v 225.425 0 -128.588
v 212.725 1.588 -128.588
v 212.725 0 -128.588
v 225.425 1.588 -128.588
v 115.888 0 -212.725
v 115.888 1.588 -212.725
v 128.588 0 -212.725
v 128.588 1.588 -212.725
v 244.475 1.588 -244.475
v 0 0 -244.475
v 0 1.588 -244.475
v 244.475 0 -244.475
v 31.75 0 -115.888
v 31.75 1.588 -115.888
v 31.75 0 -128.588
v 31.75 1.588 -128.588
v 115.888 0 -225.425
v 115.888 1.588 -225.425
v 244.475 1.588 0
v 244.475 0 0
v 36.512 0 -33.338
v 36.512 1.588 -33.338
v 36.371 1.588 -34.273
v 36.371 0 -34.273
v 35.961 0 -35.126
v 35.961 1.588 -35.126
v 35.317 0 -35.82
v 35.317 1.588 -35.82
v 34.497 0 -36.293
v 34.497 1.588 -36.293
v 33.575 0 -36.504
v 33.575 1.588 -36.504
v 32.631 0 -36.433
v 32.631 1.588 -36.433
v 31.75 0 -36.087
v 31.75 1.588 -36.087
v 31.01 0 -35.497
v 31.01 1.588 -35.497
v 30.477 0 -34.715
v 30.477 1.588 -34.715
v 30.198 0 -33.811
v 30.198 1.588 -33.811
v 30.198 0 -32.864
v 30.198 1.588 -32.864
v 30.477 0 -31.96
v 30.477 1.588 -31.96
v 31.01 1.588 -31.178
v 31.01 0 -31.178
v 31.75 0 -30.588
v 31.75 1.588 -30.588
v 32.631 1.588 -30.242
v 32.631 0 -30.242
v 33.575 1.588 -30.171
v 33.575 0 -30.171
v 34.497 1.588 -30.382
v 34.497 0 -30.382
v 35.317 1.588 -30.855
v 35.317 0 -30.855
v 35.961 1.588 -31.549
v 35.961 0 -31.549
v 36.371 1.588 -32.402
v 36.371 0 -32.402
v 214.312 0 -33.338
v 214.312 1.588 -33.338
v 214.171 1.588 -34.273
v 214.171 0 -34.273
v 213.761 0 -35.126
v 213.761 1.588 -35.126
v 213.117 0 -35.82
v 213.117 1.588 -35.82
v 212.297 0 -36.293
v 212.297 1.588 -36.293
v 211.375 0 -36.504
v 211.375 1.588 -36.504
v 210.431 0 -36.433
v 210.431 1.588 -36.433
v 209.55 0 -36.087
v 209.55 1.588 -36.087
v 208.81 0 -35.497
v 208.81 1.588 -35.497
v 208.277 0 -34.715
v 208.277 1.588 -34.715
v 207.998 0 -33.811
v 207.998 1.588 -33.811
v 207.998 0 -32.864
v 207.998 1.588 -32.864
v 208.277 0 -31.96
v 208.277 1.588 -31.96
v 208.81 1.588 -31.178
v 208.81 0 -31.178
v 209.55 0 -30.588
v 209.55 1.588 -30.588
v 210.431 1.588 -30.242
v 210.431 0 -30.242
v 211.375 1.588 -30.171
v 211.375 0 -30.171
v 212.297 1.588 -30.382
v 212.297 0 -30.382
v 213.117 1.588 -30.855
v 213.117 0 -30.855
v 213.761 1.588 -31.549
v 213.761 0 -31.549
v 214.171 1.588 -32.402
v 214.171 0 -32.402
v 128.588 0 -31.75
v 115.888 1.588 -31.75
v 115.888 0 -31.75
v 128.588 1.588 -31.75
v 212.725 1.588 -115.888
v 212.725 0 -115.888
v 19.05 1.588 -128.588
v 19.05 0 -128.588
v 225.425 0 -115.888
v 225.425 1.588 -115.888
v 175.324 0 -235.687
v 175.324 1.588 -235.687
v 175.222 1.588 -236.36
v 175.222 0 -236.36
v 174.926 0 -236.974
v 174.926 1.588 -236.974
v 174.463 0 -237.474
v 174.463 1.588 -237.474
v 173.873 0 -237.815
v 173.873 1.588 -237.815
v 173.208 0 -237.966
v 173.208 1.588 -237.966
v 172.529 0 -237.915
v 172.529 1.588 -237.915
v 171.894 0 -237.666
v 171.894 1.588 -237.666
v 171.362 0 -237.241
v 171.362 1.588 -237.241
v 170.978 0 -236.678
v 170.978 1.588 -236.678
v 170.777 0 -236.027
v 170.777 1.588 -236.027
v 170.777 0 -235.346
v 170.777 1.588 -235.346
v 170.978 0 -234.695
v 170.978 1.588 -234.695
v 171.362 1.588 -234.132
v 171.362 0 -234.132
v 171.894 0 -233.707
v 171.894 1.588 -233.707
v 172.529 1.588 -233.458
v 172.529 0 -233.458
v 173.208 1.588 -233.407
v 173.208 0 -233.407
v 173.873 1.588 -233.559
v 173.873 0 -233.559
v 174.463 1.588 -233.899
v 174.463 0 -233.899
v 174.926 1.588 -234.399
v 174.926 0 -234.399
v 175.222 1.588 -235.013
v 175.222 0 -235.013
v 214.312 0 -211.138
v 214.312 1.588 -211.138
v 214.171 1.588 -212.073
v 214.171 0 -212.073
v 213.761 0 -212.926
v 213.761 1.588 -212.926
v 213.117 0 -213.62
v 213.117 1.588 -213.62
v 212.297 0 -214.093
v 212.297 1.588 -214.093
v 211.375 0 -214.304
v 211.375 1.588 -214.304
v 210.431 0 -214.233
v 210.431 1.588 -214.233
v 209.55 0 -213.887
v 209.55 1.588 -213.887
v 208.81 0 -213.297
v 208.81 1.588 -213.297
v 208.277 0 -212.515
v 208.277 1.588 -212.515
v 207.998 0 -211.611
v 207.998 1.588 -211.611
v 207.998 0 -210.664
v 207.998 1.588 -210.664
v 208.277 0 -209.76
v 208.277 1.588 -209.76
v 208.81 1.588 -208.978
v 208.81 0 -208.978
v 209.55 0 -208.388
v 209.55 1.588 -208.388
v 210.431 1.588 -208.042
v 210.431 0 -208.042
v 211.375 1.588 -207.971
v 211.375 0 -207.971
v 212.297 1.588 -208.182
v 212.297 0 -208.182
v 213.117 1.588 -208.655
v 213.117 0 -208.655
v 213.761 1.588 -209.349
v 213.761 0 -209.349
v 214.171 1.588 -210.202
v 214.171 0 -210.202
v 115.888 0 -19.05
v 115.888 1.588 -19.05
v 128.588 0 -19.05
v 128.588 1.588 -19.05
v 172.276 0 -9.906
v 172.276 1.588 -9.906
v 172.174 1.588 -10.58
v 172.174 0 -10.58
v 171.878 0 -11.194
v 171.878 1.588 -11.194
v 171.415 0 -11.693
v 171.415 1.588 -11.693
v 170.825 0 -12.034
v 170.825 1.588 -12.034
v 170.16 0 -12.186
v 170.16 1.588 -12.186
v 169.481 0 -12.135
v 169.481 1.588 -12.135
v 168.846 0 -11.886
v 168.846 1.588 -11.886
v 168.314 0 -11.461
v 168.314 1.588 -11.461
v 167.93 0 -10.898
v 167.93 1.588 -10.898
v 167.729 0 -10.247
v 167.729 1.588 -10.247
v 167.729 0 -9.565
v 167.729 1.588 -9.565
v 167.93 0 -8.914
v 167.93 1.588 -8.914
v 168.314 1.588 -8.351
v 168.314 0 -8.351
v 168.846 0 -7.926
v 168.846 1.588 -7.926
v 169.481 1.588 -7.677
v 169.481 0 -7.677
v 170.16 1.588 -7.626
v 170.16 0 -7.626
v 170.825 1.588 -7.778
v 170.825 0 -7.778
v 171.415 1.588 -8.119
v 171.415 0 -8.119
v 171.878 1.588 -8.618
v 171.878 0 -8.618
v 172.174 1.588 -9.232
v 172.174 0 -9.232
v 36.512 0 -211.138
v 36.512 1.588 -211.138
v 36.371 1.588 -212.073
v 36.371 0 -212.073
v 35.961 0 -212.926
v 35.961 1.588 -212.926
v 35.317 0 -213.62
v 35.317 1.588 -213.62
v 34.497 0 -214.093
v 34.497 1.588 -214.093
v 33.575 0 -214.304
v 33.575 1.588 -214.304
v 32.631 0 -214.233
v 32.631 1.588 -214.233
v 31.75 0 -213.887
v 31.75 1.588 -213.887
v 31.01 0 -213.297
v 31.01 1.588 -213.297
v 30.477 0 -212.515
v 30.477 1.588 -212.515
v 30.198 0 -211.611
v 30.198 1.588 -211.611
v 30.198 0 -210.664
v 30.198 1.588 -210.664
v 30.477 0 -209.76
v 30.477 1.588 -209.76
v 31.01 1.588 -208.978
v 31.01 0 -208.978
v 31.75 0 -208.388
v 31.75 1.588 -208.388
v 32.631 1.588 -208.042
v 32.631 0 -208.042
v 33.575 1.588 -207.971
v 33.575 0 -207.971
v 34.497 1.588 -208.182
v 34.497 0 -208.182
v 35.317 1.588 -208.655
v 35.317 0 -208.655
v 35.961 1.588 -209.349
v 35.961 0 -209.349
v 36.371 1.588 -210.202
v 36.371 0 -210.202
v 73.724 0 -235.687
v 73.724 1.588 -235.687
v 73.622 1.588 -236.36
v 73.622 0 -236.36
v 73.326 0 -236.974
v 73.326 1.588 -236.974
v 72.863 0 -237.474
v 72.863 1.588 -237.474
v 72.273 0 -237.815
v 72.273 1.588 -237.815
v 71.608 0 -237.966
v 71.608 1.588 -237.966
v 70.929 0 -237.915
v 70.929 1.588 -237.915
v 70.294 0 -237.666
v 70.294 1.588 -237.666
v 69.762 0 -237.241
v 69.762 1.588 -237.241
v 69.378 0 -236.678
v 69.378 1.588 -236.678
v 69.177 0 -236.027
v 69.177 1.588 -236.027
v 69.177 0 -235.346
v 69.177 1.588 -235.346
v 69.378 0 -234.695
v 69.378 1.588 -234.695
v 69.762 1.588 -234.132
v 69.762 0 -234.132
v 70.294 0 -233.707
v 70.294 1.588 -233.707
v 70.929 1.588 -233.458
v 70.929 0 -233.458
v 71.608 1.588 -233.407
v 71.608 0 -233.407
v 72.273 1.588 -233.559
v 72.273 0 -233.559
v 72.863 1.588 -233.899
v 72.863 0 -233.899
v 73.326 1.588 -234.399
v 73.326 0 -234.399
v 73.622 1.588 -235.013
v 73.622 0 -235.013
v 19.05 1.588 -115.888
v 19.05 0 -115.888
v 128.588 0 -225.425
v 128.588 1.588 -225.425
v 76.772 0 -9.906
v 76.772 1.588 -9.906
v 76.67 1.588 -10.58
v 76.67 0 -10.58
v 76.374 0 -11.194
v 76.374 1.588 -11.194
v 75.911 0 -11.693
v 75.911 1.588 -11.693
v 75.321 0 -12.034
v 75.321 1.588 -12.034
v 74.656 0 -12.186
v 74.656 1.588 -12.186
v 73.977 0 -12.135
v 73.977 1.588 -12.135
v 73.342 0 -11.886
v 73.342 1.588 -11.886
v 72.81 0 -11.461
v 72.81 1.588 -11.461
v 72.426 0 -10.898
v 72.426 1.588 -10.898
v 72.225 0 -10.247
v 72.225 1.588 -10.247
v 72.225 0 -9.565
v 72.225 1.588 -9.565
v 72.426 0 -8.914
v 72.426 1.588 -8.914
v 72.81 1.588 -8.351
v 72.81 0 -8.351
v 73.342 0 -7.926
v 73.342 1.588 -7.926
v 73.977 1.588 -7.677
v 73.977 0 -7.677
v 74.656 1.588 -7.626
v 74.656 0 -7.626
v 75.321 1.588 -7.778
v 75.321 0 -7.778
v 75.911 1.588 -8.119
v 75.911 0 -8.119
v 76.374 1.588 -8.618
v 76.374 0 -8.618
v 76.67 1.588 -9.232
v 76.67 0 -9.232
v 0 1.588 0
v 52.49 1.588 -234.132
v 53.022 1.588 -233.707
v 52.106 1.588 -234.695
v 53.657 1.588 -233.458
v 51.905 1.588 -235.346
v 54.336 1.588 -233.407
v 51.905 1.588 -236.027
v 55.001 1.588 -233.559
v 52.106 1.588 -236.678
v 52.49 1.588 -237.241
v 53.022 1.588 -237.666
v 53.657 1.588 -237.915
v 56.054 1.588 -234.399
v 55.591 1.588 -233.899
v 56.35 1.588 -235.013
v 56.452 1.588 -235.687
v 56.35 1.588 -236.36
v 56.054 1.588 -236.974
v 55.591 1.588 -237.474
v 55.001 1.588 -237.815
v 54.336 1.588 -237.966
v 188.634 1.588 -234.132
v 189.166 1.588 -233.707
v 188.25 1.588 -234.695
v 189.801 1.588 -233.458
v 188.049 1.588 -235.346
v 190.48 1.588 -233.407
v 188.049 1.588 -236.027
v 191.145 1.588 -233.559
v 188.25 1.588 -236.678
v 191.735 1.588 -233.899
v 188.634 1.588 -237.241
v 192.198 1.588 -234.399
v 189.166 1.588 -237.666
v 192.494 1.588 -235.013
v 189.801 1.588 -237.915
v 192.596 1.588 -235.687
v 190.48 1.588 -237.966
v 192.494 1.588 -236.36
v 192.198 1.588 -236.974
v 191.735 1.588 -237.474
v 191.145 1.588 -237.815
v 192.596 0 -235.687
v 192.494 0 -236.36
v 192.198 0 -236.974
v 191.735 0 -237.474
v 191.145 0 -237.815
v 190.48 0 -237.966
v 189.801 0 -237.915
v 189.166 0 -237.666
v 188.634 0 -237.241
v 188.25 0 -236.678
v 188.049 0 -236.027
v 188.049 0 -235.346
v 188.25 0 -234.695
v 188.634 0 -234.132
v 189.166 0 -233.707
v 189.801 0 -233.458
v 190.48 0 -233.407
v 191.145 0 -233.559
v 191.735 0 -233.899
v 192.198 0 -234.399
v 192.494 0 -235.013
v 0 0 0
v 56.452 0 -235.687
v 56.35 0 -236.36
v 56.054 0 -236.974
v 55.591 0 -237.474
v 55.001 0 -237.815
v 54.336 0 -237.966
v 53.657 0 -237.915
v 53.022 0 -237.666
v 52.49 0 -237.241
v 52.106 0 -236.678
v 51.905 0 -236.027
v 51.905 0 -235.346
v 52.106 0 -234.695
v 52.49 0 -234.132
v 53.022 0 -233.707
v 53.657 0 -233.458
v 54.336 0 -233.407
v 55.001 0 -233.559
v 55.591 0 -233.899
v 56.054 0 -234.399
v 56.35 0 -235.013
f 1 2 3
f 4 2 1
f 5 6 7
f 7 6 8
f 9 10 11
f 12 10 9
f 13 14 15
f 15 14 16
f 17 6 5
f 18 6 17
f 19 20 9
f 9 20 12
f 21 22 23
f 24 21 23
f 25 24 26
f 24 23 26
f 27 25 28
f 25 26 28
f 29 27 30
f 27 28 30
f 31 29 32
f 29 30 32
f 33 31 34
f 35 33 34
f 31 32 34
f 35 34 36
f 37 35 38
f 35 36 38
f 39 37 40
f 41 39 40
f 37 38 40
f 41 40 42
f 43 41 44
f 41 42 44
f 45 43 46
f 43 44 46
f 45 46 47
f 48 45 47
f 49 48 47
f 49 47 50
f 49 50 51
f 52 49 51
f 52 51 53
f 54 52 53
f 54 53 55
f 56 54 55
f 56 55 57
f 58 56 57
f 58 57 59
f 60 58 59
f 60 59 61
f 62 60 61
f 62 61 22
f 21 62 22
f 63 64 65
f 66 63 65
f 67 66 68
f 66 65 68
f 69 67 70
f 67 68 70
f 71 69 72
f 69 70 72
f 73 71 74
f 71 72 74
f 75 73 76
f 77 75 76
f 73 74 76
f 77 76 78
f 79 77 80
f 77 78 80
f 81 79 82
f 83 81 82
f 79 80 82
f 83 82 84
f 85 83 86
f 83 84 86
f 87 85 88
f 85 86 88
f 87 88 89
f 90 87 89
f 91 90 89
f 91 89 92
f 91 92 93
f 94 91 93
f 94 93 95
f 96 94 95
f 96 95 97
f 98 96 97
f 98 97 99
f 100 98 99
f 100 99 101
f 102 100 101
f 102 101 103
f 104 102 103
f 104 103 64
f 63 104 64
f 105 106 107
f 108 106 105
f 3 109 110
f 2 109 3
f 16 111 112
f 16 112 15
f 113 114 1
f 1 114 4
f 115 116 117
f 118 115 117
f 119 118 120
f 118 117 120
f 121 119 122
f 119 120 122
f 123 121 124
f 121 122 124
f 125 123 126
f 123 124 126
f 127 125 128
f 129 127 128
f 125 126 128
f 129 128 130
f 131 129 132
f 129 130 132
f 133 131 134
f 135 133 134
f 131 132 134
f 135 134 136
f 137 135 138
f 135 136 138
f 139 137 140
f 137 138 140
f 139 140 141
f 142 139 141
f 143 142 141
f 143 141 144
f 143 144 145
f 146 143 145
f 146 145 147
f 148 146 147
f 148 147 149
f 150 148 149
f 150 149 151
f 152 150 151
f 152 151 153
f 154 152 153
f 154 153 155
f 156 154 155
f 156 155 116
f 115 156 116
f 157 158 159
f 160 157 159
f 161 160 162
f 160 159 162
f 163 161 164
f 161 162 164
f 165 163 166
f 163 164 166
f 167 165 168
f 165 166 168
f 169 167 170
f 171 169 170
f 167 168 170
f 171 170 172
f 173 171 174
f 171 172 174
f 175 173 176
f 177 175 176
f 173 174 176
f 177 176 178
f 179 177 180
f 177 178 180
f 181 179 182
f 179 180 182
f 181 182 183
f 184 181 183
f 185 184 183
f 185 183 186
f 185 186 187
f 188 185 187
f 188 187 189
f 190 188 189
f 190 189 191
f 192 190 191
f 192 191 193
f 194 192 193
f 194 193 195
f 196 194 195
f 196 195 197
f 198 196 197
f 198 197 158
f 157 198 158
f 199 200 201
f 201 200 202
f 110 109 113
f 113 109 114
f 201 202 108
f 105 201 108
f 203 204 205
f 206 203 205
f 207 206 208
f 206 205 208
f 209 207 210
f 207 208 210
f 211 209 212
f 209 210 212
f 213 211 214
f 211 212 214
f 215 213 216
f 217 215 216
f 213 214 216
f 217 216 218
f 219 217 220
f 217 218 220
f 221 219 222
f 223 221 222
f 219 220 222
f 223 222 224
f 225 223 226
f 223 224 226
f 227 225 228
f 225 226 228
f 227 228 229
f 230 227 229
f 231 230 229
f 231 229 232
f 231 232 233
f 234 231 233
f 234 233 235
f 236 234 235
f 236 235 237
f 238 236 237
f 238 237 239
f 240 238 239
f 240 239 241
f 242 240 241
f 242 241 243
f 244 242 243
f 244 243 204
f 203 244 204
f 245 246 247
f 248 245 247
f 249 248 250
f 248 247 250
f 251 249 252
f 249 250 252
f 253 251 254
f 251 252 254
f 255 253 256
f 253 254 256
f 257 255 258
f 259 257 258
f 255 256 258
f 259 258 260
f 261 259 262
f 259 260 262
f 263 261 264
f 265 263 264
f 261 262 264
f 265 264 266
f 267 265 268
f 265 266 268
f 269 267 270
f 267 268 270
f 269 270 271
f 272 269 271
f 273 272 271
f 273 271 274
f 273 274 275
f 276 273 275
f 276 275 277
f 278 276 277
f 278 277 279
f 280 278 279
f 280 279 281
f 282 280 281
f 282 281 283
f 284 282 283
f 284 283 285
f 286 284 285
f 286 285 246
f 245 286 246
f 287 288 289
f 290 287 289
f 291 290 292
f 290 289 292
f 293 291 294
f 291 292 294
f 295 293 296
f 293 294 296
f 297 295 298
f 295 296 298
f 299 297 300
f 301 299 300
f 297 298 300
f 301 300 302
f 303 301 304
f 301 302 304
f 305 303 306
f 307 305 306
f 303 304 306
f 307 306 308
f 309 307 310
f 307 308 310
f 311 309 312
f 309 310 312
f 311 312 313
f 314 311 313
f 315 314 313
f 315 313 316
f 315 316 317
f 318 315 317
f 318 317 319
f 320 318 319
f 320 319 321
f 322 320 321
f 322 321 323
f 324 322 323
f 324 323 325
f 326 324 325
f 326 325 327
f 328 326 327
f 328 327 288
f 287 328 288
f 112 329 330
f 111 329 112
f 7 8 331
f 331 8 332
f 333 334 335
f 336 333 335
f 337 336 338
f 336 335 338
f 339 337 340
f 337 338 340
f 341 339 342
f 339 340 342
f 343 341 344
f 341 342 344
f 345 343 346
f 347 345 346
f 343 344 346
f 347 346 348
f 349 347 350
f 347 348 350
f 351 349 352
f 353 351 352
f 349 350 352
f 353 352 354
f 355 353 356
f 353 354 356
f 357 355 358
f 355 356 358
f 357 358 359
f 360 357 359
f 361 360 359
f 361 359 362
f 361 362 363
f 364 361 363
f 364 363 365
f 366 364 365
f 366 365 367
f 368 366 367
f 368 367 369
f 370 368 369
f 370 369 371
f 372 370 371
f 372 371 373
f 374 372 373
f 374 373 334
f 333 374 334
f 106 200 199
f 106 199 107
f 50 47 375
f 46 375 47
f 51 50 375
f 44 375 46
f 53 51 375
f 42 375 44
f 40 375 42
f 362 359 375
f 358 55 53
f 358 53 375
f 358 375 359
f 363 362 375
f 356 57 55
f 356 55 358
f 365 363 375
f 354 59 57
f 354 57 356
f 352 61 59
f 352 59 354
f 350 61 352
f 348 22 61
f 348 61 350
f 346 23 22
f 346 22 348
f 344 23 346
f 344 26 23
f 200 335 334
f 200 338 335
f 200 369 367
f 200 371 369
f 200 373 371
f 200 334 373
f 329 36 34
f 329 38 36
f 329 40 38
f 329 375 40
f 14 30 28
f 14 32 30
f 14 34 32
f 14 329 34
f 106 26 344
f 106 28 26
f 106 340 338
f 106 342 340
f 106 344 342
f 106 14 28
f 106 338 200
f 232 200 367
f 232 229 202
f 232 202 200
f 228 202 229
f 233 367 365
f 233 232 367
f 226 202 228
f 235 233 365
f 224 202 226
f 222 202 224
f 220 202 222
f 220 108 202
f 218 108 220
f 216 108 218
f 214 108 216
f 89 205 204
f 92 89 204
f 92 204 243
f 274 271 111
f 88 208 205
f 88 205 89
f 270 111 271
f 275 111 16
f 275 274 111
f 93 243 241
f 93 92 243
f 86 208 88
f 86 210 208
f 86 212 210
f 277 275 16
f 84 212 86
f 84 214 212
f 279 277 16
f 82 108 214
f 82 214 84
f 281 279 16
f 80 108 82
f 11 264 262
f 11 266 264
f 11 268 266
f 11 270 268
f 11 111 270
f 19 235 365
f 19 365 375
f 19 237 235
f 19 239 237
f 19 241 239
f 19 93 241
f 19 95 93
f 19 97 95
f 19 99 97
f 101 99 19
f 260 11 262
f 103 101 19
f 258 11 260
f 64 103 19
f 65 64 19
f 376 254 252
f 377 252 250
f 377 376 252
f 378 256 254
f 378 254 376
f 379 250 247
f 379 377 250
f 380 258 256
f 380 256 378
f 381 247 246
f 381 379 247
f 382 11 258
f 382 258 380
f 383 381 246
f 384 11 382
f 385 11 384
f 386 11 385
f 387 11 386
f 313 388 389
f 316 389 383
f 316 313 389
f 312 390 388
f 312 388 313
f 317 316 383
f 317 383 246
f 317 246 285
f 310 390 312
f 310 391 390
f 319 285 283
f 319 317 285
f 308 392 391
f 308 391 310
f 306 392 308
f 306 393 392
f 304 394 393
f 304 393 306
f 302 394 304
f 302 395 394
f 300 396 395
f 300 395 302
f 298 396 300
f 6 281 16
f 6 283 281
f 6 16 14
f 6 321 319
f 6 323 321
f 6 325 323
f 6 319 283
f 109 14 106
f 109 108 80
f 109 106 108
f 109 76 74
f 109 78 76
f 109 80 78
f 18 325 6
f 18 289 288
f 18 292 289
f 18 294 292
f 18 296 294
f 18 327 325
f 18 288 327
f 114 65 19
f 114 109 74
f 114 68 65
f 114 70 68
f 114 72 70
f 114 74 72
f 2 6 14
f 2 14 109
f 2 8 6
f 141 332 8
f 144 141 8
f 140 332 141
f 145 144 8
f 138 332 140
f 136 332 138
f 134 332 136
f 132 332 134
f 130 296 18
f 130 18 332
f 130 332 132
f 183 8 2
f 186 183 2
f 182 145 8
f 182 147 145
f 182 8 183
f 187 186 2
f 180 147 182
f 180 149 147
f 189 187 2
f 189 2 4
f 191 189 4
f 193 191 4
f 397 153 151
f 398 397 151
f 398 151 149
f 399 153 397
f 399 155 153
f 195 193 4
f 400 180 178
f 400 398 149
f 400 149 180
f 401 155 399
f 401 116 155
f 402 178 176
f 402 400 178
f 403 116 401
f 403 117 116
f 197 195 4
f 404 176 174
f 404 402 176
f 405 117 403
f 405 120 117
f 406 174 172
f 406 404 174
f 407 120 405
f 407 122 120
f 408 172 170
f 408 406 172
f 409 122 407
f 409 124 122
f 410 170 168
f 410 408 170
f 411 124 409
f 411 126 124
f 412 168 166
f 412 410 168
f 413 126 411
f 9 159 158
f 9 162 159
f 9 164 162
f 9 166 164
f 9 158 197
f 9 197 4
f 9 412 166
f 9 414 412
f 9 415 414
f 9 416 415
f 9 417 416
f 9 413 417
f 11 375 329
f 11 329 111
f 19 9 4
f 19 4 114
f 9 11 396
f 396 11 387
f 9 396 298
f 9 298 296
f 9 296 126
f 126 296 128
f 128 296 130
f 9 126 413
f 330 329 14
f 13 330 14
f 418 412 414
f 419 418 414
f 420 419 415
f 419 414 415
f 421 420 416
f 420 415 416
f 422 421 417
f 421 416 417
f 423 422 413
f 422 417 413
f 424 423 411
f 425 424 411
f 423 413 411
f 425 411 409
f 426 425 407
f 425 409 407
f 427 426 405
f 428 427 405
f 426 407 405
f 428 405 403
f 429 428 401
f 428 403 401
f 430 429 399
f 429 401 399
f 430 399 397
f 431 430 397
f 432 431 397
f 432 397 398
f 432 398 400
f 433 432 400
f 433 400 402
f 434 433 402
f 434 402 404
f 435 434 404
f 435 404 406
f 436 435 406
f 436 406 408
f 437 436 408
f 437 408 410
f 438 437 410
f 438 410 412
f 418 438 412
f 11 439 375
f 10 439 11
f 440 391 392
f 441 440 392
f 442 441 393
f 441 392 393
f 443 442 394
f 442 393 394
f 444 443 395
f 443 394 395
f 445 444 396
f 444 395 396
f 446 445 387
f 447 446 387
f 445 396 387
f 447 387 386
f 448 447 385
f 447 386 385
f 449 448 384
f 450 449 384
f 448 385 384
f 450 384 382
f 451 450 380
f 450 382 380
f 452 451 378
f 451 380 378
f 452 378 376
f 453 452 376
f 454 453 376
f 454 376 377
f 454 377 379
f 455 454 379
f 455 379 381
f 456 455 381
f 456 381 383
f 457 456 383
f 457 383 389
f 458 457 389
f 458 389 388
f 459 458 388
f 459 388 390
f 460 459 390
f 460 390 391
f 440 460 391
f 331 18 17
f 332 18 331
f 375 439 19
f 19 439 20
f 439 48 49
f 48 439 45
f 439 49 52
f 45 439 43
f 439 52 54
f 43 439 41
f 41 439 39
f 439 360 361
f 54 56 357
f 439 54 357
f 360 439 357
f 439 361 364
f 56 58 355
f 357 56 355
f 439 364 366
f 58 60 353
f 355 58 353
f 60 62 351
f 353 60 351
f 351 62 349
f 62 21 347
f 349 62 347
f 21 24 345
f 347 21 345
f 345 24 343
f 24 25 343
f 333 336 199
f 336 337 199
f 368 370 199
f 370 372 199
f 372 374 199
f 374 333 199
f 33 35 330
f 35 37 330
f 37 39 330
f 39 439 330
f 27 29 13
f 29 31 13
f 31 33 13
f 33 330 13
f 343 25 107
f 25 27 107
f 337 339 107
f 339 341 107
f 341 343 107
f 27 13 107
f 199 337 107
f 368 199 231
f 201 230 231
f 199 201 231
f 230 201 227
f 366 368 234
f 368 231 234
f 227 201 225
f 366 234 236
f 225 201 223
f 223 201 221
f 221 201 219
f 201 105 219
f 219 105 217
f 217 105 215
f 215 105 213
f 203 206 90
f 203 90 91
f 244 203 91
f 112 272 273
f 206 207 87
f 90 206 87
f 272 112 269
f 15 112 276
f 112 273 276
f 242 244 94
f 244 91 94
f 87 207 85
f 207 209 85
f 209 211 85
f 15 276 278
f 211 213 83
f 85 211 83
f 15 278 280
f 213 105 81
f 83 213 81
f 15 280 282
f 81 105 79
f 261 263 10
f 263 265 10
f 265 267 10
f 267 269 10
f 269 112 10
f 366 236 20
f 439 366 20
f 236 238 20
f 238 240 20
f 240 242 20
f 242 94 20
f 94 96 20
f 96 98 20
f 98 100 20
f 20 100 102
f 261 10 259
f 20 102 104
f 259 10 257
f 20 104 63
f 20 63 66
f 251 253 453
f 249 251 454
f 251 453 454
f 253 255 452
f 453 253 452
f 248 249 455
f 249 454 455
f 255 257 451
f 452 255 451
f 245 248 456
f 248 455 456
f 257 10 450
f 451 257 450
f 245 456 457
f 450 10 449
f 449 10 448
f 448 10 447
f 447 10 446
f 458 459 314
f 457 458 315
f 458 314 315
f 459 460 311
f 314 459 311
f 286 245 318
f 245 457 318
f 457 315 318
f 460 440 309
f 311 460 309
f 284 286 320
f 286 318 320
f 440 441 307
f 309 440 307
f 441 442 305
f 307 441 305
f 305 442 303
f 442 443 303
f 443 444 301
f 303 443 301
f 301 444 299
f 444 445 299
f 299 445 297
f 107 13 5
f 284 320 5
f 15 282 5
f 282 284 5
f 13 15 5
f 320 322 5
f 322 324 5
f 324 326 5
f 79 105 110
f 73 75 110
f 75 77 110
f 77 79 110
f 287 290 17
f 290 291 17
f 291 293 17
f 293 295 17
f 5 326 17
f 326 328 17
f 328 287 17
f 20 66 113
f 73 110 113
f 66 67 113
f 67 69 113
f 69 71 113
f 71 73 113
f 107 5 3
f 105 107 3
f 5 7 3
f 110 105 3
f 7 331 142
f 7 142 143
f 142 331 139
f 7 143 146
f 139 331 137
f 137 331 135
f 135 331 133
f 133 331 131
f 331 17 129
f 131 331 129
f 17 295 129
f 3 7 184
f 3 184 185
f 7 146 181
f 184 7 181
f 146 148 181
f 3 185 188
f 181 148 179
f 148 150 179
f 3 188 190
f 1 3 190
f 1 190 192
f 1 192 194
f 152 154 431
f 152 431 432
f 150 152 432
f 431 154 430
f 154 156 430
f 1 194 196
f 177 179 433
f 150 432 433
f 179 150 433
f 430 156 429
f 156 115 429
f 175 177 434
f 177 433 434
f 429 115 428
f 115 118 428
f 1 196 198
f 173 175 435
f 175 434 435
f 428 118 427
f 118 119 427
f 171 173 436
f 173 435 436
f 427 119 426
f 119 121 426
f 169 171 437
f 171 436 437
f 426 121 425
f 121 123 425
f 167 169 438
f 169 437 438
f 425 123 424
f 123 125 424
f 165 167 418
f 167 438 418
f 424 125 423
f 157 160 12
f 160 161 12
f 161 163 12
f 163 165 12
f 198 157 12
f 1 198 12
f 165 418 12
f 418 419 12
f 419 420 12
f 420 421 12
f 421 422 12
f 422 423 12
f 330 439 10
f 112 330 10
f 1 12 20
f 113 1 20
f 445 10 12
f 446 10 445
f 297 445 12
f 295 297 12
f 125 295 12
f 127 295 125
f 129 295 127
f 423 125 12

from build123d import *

# Parameters (mm, degrees)
SKETCH1_W               = 244.475
SKETCH1_H               = 244.475
MAIN_BODY_DEPTH         = 1.5875
SKETCH2_R               = 2.286
HINGES_LOCK_HOLES_DEPTH = 2.5875
SKETCH3_R               = 3.175
THREAD_HOLES_DEPTH      = 2.5875
SKETCH4_W               = 12.7
SKETCH4_H               = 12.7
LED_HOLES_DEPTH         = 2.5875


with BuildPart() as part:
    # Sketch1 → Main Body (new body)
    with BuildSketch(Plane(origin=(0, 0, 0), x_dir=(1, 0, 0), z_dir=(0, 1, 0))):
        with Locations((122.2375, 122.2375)):
            Rectangle(SKETCH1_W, SKETCH1_H)
    extrude(amount=MAIN_BODY_DEPTH)

    # Sketch2 → Hinges/Lock Holes (cut, through all)
    with BuildSketch(Plane(origin=(0, 1.5875, 0), x_dir=(1, 0, 0), z_dir=(0, 1, 0))):
        with Locations((54.1655, 235.6866)):
            Circle(SKETCH2_R)
        with Locations((71.4375, 235.6866)):
            Circle(SKETCH2_R)
        with Locations((173.0375, 235.6866)):
            Circle(SKETCH2_R)
        with Locations((190.3095, 235.6866)):
            Circle(SKETCH2_R)
        with Locations((74.4855, 9.906)):
            Circle(SKETCH2_R)
        with Locations((169.9895, 9.906)):
            Circle(SKETCH2_R)
    extrude(amount=-HINGES_LOCK_HOLES_DEPTH, mode=Mode.SUBTRACT)

    # Sketch3 → Thread Holes (cut, through all)
    with BuildSketch(Plane(origin=(0, 1.5875, 0), x_dir=(1, 0, 0), z_dir=(0, 1, 0))):
        with Locations((211.1375, 33.3375)):
            Circle(SKETCH3_R)
        with Locations((33.3375, 211.1375)):
            Circle(SKETCH3_R)
        with Locations((211.1375, 211.1375)):
            Circle(SKETCH3_R)
        with Locations((33.3375, 33.3375)):
            Circle(SKETCH3_R)
    extrude(amount=-THREAD_HOLES_DEPTH, mode=Mode.SUBTRACT)

    # Sketch4 → LED Holes (cut, through all)
    with BuildSketch(Plane(origin=(0, 1.5875, 0), x_dir=(1, 0, 0), z_dir=(0, 1, 0))):
        with Locations((122.2375, 25.4)):
            Rectangle(SKETCH4_W, SKETCH4_H)
        with Locations((25.4, 122.2375)):
            Rectangle(SKETCH4_W, SKETCH4_H)
        with Locations((122.2375, 219.075)):
            Rectangle(SKETCH4_W, SKETCH4_H)
        with Locations((219.075, 122.2375)):
            Rectangle(SKETCH4_W, SKETCH4_H)
    extrude(amount=-LED_HOLES_DEPTH, mode=Mode.SUBTRACT)


solid = part.part
